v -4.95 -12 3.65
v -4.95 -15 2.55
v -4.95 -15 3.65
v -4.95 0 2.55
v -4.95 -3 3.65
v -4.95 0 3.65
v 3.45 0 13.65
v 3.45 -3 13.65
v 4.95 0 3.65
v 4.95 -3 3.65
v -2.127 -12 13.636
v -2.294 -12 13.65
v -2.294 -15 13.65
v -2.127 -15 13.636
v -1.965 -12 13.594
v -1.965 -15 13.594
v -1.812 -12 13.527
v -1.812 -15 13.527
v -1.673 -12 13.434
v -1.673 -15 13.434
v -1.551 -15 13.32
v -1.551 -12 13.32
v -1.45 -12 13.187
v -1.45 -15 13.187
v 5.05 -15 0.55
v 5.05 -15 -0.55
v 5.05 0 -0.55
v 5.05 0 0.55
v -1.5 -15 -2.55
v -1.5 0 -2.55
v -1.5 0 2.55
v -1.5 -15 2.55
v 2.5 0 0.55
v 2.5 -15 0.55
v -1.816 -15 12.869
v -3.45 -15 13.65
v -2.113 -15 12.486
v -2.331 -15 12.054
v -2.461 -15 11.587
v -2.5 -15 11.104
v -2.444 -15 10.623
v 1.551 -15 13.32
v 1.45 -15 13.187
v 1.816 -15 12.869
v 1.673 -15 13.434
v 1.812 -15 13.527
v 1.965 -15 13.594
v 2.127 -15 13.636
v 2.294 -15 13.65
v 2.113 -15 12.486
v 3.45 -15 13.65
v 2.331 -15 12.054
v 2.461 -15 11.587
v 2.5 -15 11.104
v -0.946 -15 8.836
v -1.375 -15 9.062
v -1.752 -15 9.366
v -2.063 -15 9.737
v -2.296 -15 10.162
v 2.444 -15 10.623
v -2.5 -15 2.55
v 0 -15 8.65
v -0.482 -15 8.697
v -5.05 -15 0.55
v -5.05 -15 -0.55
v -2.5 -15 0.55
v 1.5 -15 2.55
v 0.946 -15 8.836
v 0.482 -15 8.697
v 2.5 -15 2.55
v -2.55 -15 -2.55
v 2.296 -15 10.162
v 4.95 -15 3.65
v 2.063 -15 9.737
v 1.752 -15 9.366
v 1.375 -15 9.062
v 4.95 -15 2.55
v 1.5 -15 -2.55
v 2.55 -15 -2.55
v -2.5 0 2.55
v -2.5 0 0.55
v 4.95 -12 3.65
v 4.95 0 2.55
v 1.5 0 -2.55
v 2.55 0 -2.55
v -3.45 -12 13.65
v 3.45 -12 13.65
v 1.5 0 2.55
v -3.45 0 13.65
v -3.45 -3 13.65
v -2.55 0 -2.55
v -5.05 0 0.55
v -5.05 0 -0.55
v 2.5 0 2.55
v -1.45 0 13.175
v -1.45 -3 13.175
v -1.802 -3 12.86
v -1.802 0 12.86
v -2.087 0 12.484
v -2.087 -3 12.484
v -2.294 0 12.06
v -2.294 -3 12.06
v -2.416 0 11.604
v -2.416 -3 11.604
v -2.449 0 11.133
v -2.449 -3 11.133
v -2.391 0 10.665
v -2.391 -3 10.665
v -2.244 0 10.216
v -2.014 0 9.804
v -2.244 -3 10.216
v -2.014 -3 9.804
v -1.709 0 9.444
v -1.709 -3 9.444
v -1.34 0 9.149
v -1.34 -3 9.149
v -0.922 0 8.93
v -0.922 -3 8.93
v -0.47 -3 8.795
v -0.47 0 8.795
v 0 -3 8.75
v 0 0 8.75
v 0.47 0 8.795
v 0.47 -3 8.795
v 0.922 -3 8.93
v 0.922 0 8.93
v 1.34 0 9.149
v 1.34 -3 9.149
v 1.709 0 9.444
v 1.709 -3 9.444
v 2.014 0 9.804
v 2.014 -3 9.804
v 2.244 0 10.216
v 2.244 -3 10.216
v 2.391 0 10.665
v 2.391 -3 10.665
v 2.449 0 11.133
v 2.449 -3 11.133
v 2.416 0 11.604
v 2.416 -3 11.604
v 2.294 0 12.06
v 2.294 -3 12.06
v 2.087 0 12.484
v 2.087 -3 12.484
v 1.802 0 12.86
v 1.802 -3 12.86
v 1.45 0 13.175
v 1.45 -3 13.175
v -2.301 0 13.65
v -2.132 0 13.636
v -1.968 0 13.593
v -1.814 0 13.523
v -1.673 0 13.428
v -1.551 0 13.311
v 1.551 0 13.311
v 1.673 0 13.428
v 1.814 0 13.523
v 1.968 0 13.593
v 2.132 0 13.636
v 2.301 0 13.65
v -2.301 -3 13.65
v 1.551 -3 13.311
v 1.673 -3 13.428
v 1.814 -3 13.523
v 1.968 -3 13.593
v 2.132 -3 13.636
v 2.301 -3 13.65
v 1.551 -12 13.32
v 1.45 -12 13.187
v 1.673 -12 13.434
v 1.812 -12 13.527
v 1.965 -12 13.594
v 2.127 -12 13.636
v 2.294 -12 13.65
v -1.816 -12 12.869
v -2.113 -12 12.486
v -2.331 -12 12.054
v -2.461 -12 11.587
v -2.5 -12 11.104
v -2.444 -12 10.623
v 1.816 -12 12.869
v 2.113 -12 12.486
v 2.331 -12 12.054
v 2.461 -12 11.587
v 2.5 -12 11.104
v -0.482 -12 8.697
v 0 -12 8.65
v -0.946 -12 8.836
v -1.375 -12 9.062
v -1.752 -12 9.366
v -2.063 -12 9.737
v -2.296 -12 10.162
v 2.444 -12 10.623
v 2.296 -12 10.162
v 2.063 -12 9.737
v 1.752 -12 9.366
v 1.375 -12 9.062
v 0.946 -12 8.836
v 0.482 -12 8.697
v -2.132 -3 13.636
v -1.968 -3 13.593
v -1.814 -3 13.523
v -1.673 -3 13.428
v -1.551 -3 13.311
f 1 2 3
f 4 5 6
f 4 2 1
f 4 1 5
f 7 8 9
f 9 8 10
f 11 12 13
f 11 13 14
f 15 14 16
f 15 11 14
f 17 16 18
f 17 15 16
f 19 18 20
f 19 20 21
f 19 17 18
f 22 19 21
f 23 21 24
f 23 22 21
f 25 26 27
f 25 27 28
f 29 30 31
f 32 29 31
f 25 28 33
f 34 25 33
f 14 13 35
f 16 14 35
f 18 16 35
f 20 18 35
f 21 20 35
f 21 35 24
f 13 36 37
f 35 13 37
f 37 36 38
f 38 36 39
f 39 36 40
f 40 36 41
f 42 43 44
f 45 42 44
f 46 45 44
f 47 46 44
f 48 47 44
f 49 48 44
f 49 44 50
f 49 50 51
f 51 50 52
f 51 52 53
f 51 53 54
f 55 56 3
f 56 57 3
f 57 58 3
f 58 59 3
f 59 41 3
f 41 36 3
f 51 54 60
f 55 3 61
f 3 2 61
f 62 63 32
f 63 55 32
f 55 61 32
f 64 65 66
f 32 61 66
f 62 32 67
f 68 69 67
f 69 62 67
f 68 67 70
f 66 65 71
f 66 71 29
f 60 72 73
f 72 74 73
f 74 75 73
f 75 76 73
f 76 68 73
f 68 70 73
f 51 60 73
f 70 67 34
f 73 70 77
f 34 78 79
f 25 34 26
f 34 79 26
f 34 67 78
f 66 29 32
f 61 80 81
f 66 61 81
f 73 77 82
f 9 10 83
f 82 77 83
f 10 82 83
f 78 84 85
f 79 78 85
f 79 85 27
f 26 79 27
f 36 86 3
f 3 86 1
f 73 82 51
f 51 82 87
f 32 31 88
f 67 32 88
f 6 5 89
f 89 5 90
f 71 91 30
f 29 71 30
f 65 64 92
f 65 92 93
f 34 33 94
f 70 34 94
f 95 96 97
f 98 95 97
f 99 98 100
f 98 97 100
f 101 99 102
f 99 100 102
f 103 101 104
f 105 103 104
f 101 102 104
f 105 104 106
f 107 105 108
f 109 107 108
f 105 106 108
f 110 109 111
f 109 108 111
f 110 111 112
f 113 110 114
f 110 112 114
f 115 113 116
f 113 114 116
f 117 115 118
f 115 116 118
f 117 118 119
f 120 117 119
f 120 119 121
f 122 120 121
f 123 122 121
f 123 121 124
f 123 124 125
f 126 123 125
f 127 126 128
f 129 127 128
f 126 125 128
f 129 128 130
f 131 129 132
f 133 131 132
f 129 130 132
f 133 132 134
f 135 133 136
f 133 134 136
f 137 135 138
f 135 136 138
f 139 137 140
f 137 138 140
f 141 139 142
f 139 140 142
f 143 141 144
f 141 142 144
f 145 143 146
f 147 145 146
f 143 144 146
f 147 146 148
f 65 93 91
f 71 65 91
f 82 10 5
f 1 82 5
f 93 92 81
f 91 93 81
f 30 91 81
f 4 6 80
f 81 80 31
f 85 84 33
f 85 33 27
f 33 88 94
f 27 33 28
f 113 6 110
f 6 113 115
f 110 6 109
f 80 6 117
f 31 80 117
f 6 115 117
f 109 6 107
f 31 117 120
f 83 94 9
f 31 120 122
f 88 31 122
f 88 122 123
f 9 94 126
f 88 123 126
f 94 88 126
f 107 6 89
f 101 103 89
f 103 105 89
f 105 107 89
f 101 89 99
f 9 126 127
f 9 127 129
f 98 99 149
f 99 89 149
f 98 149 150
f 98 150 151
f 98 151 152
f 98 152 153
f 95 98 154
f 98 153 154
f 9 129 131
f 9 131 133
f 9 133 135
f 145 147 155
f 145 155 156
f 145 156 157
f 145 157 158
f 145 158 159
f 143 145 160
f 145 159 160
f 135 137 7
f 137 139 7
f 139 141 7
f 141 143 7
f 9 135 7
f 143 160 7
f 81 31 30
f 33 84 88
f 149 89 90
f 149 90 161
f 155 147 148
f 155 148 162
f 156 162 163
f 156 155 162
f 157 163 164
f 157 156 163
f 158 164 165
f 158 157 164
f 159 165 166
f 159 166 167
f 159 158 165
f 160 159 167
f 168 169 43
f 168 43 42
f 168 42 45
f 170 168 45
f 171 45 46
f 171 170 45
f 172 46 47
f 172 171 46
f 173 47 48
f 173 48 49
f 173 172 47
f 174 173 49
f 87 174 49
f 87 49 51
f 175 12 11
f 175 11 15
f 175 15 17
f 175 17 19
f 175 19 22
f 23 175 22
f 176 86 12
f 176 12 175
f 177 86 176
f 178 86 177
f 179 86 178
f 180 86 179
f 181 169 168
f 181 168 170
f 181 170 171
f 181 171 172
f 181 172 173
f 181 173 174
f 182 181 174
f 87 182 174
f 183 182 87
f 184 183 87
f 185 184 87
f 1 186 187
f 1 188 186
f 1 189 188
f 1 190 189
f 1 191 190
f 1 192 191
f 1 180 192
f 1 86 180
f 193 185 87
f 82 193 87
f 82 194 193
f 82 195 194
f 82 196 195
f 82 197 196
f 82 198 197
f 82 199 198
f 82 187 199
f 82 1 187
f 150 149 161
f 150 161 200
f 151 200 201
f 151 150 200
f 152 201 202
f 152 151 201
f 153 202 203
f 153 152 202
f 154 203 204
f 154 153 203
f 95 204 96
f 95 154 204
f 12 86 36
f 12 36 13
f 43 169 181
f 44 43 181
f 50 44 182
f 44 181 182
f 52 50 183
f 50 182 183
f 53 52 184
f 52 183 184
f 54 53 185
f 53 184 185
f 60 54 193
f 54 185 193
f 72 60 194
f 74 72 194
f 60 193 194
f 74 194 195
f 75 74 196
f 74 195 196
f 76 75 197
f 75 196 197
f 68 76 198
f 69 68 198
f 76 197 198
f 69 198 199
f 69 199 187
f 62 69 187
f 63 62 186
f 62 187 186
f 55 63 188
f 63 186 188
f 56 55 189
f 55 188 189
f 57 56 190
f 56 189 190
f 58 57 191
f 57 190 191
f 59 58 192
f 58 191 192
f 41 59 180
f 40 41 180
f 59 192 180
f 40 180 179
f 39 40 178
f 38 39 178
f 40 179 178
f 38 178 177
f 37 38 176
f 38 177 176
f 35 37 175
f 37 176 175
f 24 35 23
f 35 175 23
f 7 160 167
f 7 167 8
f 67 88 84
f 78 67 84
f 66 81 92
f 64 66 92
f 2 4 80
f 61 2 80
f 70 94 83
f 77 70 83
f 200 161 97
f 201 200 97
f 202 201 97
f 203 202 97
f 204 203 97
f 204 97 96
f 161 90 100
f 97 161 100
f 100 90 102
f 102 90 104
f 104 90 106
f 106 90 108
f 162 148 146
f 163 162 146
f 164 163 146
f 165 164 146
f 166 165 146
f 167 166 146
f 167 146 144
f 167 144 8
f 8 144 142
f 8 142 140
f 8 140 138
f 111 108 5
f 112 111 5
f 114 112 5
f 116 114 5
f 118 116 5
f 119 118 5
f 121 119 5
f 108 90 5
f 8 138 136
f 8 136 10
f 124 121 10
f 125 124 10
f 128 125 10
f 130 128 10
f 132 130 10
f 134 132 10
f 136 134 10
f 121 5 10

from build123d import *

# Parameters (mm, degrees)
F1_DEPTH     = 15
F3_DEPTH     = 25
F7_W         = 9.9
F7_H         = 3
F8_DEPTH     = 10
F10_DEPTH    = 3
F12_DEPTH    = 3
F13_T1_DEPTH = 7.2559990627
F13_T3_DEPTH = 7.2193706768


# Not quite as in the source:
# - a fillet or chamfer that OpenCascade refuses, or shapes differently, is made with other operations: its cross-section is extruded or revolved along the edge and cut away or added
# - a feature of the source that left no trace in its solid (it failed there, or was rolled back) is left out


with BuildPart() as f1:
    # F0 (on Front) → F1 (new body)
    with BuildSketch(Plane.XZ):
        Polygon((-2.5, 0.55), (-5.05, 0.55), (-5.05, -0.55), (-2.55, -2.55), (-1.5, -2.55), (-1.5, 2.55), (0, 2.55), (1.5, 2.55), (1.5, -2.55), (2.55, -2.55), (5.05, -0.55), (5.05, 0.55), (2.5, 0.55), (2.5, 2.55), (4.95, 2.55), (4.95, 3.65), (-4.95, 3.65), (-4.95, 2.55), (-2.5, 2.55), align=None)
    extrude(amount=F1_DEPTH)

    # F7 (on face) → F8 (join)
    with BuildSketch(Plane.XY.offset(3.65)):
        with Locations((0, -13.5)):
            Rectangle(F7_W, F7_H)
        with Locations((0, -1.5)):
            Rectangle(F7_W, F7_H)
    extrude(amount=F8_DEPTH)

    # F9 (on face) → F10 (cut, through all)
    with BuildSketch(Plane.XZ.offset(3)):
        with BuildLine():
            Line((-1.45, 13.65), (-1.45, 13.1748417658))
            ThreePointArc((-1.45, 13.1748417658), (0, 8.75), (1.45, 13.1748417658))
            Line((1.45, 13.1748417658), (1.45, 13.65))
            Line((1.45, 13.65), (-1.45, 13.65))
        make_face()
        Polygon((-4.95, 3.65), (-3.45, 13.65), (-4.95, 13.65), align=None)
        Polygon((4.95, 13.65), (3.45, 13.65), (4.95, 3.65), align=None)
    extrude(amount=-F10_DEPTH, mode=Mode.SUBTRACT)

    # F11 (on face) → F12 (cut, through all)
    with BuildSketch(Plane(origin=(0, -12, 0), x_dir=(-1, 0, 0), z_dir=(0, 1, 0))):
        with BuildLine():
            Line((-1.45, 13.65), (-1.45, 13.1865411854))
            ThreePointArc((-1.45, 13.1865411854), (0, 8.65), (1.45, 13.1865411854))
            Line((1.45, 13.1865411854), (1.45, 13.65))
            Line((1.45, 13.65), (-1.45, 13.65))
        make_face()
        Polygon((4.95, 13.65), (3.45, 13.65), (4.95, 3.65), align=None)
        Polygon((-4.95, 3.65), (-3.45, 13.65), (-4.95, 13.65), align=None)
    extrude(amount=-F12_DEPTH, mode=Mode.SUBTRACT)

    # F13: fillet of radius 1 on 4 edges, made by hand

    # F13_s2 → F13_t1 (cut)
    with BuildSketch(Plane.XZ.offset(-2.1279995313)):
        with BuildLine():
            ThreePointArc((1.45, 13.1748417658), (1.8137789296, 13.5231671563), (2.3011998125, 13.65))
            Line((2.3011998125, 13.65), (1.45, 13.65))
            Line((1.45, 13.65), (1.45, 13.1748417658))
        make_face()
        with BuildLine():
            ThreePointArc((-2.3011998125, 13.65), (-1.8137789296, 13.5231671563), (-1.45, 13.1748417658))
            Line((-1.45, 13.1748417658), (-1.45, 13.65))
            Line((-1.45, 13.65), (-2.3011998125, 13.65))
        make_face()
    extrude(amount=F13_T1_DEPTH, mode=Mode.SUBTRACT)

    # F13_s4 → F13_t3 (cut)
    with BuildSketch(Plane.XZ.offset(9.8903146616)):
        with BuildLine():
            ThreePointArc((1.45, 13.1865411854), (1.8124913279, 13.5265104636), (2.2938741354, 13.65))
            Line((2.2938741354, 13.65), (1.45, 13.65))
            Line((1.45, 13.65), (1.45, 13.1865411854))
        make_face()
        with BuildLine():
            ThreePointArc((-2.2938741354, 13.65), (-1.8124913279, 13.5265104636), (-1.45, 13.1865411854))
            Line((-1.45, 13.1865411854), (-1.45, 13.65))
            Line((-1.45, 13.65), (-2.2938741354, 13.65))
        make_face()
    extrude(amount=F13_T3_DEPTH, mode=Mode.SUBTRACT)


with BuildPart() as f3:
    # F2 (on face) → F3 (new body)
    with BuildSketch(Plane.XZ.offset(15)):
        with BuildLine():
            Line((-4.95, 3.65), (-4.0832418439, 3.65))
            Line((-4.0832418439, 3.65), (-0.75, 6.847274811))
            Line((-0.75, 6.847274811), (-0.75, 3.65))
            Line((-0.75, 3.65), (0.75, 3.65))
            Line((0.75, 3.65), (0.75, 6.828679691))
            Line((0.75, 6.828679691), (3.917720968, 3.65))
            Line((3.917720968, 3.65), (4.7647876878, 3.65))
            Line((4.7647876878, 3.65), (0.75, 7.6786768362))
            Line((0.75, 7.6786768362), (0.75, 7.9286768362))
            ThreePointArc((0.75, 7.9286768362), (0.6035533906, 8.2822302268), (0.25, 8.4286768362))
            Line((0.25, 8.4286768362), (-0.25, 8.4286768362))
            ThreePointArc((-0.25, 8.4286768362), (-0.6035533906, 8.2822302268), (-0.75, 7.9286768362))
            Line((-0.75, 7.9286768362), (-0.75, 7.6786768362))
            Line((-0.75, 7.6786768362), (-4.95, 3.65))
        make_face()
    extrude(amount=-F3_DEPTH)


solid = f1.part
